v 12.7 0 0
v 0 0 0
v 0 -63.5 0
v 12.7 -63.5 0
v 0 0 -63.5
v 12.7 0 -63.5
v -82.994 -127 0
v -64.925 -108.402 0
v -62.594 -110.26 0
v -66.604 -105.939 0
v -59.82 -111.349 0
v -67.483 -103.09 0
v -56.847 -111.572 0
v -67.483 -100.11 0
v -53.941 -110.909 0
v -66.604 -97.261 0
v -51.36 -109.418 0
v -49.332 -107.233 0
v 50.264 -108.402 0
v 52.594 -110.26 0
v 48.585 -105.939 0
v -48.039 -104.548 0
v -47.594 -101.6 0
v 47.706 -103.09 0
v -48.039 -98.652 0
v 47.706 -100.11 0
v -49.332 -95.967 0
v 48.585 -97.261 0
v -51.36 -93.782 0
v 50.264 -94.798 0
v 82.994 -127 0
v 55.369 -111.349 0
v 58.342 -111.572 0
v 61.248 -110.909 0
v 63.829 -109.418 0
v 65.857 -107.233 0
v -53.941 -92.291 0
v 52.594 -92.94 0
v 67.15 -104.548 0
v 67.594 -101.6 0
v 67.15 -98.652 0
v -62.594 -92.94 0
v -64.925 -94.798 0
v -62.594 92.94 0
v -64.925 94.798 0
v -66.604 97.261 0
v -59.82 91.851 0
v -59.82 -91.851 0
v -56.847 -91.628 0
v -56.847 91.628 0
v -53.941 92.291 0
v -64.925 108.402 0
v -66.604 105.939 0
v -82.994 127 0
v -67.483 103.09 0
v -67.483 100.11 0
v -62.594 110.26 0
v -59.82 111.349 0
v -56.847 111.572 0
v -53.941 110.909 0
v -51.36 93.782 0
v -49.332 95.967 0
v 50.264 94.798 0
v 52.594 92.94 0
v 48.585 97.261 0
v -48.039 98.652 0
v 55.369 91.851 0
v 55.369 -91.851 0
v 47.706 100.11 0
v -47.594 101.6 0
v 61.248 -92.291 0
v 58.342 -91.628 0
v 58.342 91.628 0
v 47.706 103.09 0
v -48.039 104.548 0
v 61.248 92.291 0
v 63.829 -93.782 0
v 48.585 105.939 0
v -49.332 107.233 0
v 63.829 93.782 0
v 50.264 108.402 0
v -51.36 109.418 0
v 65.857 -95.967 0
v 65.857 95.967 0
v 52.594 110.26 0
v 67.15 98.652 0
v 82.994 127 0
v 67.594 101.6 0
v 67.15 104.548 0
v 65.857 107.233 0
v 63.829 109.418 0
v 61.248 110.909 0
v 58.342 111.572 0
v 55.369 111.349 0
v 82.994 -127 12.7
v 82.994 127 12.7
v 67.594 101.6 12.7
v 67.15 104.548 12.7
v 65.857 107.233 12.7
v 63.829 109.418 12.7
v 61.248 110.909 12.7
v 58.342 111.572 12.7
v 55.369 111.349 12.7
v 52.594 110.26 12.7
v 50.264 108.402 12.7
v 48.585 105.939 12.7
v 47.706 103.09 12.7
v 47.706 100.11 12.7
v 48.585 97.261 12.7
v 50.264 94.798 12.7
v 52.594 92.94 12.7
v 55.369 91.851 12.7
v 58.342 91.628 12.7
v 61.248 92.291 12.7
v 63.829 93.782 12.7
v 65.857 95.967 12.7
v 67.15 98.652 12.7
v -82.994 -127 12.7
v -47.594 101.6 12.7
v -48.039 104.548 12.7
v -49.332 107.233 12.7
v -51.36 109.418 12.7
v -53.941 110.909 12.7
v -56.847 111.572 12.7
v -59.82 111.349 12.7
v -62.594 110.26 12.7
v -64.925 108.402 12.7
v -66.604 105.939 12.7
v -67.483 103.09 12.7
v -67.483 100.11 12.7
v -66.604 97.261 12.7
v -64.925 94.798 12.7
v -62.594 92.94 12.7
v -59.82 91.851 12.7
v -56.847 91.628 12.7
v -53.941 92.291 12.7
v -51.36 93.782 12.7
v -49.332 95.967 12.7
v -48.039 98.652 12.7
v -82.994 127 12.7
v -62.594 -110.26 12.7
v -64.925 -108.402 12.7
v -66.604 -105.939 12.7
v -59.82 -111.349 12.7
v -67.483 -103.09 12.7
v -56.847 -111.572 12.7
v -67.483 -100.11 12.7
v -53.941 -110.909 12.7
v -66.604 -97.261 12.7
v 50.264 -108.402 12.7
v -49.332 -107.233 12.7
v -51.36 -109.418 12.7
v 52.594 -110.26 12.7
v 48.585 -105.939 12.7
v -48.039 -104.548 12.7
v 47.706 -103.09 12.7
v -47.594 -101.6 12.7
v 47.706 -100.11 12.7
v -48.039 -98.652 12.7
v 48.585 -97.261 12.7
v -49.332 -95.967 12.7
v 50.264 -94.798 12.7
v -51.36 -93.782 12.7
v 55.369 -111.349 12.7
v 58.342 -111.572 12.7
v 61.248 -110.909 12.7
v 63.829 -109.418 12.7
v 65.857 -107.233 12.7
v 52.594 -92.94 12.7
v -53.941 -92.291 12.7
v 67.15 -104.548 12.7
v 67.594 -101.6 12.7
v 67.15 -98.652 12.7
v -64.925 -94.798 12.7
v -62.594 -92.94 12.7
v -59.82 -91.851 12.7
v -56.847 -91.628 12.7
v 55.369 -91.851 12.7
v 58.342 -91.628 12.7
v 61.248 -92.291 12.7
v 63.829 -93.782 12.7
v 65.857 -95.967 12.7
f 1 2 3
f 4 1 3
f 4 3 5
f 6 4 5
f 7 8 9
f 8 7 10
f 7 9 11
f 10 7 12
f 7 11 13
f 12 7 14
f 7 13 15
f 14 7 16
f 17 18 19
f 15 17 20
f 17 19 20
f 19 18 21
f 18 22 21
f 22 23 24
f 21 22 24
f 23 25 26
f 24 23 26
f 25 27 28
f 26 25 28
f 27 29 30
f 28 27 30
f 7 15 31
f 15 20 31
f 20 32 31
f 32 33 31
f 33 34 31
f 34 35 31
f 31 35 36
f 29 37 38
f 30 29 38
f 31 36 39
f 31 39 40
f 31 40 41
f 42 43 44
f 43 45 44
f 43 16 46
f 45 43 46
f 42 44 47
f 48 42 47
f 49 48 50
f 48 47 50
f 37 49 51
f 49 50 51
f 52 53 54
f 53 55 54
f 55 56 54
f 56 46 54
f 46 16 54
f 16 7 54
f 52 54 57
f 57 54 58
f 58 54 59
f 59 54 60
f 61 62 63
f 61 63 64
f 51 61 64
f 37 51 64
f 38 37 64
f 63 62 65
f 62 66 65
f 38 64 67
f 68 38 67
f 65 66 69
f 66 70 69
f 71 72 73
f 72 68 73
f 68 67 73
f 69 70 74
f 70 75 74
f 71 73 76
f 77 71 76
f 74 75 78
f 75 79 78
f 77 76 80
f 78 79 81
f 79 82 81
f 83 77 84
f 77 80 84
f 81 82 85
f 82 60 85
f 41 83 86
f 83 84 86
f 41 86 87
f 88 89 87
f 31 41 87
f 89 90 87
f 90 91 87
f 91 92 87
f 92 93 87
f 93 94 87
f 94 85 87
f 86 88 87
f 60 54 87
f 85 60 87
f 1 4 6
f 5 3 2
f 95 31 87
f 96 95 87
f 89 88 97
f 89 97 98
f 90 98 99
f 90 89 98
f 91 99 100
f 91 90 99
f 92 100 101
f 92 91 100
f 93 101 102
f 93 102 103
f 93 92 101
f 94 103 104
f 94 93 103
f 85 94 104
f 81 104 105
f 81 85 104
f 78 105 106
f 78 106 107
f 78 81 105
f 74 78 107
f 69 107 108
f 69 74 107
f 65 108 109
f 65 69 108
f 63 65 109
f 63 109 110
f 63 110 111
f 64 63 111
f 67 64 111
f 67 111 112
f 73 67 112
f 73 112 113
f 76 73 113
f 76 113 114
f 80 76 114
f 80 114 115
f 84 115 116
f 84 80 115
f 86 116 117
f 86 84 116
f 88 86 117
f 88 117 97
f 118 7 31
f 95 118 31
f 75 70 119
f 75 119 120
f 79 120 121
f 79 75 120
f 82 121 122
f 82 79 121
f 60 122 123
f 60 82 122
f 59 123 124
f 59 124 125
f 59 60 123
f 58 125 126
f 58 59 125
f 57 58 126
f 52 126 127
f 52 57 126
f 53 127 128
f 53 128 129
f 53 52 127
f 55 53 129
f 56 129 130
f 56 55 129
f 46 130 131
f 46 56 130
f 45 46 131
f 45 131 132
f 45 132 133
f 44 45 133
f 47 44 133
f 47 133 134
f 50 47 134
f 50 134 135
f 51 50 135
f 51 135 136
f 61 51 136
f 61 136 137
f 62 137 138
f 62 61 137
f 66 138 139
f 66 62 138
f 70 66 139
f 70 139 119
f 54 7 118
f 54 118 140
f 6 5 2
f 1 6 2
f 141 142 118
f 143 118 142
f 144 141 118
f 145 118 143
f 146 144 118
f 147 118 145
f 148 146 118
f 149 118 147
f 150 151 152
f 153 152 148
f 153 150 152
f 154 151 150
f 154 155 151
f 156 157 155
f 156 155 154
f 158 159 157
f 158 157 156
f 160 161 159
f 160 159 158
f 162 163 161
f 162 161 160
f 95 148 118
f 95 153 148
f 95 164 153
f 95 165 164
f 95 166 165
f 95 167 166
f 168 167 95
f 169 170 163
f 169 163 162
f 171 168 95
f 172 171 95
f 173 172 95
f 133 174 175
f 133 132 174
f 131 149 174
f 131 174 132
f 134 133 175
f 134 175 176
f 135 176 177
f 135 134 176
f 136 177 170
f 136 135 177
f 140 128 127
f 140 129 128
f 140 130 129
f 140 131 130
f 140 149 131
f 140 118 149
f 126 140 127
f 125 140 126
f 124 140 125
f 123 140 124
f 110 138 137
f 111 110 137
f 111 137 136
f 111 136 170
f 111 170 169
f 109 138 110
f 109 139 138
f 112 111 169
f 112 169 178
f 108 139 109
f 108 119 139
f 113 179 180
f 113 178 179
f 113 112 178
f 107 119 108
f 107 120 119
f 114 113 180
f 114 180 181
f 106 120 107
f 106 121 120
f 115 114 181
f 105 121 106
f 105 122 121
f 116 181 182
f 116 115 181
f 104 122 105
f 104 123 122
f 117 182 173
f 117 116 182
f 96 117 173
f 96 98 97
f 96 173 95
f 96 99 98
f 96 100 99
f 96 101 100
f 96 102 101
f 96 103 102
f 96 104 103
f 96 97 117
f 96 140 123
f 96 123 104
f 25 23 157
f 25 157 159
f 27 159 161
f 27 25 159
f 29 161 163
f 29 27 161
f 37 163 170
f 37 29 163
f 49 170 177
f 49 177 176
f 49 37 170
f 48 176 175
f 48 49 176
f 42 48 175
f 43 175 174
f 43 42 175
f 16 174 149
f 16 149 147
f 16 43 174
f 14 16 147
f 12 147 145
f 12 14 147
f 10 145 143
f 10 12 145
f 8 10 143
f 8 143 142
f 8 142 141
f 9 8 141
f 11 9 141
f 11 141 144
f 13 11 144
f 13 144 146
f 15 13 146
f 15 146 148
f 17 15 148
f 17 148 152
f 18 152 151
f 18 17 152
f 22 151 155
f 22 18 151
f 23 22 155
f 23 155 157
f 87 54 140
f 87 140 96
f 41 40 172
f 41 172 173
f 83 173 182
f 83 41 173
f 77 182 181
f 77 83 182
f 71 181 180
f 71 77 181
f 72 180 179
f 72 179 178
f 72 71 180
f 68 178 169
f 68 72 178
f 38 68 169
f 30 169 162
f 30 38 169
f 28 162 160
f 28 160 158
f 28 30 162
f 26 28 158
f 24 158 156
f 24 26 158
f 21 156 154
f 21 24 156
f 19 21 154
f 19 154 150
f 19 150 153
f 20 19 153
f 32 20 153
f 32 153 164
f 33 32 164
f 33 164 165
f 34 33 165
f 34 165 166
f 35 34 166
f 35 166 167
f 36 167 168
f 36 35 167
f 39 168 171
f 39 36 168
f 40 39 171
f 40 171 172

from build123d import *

# Parameters (mm, degrees)
F0_W     = 165.989
F0_H     = 254
F0_R     = 10
F1_DEPTH = 12.7
F3_DEPTH = 12.7


with BuildPart() as f1:
    # F0 (on Top) → F1 (new body)
    with BuildSketch(Plane.XY):
        Rectangle(F0_W, F0_H)
        with Locations((-57.5945, -101.6)):
            Circle(F0_R, mode=Mode.SUBTRACT)
        with Locations((57.5945, -101.6)):
            Circle(F0_R, mode=Mode.SUBTRACT)
        with Locations((-57.5945, 101.6)):
            Circle(F0_R, mode=Mode.SUBTRACT)
        with Locations((57.5945, 101.6)):
            Circle(F0_R, mode=Mode.SUBTRACT)
    extrude(amount=F1_DEPTH)


with BuildPart() as f3:
    # F2 (on Right) → F3 (new body)
    with BuildSketch(Plane.YZ):
        Polygon((0, -63.5), (0, 0), (-63.5, 0), align=None)
    extrude(amount=F3_DEPTH)


solid = Compound([f1.part, f3.part])
